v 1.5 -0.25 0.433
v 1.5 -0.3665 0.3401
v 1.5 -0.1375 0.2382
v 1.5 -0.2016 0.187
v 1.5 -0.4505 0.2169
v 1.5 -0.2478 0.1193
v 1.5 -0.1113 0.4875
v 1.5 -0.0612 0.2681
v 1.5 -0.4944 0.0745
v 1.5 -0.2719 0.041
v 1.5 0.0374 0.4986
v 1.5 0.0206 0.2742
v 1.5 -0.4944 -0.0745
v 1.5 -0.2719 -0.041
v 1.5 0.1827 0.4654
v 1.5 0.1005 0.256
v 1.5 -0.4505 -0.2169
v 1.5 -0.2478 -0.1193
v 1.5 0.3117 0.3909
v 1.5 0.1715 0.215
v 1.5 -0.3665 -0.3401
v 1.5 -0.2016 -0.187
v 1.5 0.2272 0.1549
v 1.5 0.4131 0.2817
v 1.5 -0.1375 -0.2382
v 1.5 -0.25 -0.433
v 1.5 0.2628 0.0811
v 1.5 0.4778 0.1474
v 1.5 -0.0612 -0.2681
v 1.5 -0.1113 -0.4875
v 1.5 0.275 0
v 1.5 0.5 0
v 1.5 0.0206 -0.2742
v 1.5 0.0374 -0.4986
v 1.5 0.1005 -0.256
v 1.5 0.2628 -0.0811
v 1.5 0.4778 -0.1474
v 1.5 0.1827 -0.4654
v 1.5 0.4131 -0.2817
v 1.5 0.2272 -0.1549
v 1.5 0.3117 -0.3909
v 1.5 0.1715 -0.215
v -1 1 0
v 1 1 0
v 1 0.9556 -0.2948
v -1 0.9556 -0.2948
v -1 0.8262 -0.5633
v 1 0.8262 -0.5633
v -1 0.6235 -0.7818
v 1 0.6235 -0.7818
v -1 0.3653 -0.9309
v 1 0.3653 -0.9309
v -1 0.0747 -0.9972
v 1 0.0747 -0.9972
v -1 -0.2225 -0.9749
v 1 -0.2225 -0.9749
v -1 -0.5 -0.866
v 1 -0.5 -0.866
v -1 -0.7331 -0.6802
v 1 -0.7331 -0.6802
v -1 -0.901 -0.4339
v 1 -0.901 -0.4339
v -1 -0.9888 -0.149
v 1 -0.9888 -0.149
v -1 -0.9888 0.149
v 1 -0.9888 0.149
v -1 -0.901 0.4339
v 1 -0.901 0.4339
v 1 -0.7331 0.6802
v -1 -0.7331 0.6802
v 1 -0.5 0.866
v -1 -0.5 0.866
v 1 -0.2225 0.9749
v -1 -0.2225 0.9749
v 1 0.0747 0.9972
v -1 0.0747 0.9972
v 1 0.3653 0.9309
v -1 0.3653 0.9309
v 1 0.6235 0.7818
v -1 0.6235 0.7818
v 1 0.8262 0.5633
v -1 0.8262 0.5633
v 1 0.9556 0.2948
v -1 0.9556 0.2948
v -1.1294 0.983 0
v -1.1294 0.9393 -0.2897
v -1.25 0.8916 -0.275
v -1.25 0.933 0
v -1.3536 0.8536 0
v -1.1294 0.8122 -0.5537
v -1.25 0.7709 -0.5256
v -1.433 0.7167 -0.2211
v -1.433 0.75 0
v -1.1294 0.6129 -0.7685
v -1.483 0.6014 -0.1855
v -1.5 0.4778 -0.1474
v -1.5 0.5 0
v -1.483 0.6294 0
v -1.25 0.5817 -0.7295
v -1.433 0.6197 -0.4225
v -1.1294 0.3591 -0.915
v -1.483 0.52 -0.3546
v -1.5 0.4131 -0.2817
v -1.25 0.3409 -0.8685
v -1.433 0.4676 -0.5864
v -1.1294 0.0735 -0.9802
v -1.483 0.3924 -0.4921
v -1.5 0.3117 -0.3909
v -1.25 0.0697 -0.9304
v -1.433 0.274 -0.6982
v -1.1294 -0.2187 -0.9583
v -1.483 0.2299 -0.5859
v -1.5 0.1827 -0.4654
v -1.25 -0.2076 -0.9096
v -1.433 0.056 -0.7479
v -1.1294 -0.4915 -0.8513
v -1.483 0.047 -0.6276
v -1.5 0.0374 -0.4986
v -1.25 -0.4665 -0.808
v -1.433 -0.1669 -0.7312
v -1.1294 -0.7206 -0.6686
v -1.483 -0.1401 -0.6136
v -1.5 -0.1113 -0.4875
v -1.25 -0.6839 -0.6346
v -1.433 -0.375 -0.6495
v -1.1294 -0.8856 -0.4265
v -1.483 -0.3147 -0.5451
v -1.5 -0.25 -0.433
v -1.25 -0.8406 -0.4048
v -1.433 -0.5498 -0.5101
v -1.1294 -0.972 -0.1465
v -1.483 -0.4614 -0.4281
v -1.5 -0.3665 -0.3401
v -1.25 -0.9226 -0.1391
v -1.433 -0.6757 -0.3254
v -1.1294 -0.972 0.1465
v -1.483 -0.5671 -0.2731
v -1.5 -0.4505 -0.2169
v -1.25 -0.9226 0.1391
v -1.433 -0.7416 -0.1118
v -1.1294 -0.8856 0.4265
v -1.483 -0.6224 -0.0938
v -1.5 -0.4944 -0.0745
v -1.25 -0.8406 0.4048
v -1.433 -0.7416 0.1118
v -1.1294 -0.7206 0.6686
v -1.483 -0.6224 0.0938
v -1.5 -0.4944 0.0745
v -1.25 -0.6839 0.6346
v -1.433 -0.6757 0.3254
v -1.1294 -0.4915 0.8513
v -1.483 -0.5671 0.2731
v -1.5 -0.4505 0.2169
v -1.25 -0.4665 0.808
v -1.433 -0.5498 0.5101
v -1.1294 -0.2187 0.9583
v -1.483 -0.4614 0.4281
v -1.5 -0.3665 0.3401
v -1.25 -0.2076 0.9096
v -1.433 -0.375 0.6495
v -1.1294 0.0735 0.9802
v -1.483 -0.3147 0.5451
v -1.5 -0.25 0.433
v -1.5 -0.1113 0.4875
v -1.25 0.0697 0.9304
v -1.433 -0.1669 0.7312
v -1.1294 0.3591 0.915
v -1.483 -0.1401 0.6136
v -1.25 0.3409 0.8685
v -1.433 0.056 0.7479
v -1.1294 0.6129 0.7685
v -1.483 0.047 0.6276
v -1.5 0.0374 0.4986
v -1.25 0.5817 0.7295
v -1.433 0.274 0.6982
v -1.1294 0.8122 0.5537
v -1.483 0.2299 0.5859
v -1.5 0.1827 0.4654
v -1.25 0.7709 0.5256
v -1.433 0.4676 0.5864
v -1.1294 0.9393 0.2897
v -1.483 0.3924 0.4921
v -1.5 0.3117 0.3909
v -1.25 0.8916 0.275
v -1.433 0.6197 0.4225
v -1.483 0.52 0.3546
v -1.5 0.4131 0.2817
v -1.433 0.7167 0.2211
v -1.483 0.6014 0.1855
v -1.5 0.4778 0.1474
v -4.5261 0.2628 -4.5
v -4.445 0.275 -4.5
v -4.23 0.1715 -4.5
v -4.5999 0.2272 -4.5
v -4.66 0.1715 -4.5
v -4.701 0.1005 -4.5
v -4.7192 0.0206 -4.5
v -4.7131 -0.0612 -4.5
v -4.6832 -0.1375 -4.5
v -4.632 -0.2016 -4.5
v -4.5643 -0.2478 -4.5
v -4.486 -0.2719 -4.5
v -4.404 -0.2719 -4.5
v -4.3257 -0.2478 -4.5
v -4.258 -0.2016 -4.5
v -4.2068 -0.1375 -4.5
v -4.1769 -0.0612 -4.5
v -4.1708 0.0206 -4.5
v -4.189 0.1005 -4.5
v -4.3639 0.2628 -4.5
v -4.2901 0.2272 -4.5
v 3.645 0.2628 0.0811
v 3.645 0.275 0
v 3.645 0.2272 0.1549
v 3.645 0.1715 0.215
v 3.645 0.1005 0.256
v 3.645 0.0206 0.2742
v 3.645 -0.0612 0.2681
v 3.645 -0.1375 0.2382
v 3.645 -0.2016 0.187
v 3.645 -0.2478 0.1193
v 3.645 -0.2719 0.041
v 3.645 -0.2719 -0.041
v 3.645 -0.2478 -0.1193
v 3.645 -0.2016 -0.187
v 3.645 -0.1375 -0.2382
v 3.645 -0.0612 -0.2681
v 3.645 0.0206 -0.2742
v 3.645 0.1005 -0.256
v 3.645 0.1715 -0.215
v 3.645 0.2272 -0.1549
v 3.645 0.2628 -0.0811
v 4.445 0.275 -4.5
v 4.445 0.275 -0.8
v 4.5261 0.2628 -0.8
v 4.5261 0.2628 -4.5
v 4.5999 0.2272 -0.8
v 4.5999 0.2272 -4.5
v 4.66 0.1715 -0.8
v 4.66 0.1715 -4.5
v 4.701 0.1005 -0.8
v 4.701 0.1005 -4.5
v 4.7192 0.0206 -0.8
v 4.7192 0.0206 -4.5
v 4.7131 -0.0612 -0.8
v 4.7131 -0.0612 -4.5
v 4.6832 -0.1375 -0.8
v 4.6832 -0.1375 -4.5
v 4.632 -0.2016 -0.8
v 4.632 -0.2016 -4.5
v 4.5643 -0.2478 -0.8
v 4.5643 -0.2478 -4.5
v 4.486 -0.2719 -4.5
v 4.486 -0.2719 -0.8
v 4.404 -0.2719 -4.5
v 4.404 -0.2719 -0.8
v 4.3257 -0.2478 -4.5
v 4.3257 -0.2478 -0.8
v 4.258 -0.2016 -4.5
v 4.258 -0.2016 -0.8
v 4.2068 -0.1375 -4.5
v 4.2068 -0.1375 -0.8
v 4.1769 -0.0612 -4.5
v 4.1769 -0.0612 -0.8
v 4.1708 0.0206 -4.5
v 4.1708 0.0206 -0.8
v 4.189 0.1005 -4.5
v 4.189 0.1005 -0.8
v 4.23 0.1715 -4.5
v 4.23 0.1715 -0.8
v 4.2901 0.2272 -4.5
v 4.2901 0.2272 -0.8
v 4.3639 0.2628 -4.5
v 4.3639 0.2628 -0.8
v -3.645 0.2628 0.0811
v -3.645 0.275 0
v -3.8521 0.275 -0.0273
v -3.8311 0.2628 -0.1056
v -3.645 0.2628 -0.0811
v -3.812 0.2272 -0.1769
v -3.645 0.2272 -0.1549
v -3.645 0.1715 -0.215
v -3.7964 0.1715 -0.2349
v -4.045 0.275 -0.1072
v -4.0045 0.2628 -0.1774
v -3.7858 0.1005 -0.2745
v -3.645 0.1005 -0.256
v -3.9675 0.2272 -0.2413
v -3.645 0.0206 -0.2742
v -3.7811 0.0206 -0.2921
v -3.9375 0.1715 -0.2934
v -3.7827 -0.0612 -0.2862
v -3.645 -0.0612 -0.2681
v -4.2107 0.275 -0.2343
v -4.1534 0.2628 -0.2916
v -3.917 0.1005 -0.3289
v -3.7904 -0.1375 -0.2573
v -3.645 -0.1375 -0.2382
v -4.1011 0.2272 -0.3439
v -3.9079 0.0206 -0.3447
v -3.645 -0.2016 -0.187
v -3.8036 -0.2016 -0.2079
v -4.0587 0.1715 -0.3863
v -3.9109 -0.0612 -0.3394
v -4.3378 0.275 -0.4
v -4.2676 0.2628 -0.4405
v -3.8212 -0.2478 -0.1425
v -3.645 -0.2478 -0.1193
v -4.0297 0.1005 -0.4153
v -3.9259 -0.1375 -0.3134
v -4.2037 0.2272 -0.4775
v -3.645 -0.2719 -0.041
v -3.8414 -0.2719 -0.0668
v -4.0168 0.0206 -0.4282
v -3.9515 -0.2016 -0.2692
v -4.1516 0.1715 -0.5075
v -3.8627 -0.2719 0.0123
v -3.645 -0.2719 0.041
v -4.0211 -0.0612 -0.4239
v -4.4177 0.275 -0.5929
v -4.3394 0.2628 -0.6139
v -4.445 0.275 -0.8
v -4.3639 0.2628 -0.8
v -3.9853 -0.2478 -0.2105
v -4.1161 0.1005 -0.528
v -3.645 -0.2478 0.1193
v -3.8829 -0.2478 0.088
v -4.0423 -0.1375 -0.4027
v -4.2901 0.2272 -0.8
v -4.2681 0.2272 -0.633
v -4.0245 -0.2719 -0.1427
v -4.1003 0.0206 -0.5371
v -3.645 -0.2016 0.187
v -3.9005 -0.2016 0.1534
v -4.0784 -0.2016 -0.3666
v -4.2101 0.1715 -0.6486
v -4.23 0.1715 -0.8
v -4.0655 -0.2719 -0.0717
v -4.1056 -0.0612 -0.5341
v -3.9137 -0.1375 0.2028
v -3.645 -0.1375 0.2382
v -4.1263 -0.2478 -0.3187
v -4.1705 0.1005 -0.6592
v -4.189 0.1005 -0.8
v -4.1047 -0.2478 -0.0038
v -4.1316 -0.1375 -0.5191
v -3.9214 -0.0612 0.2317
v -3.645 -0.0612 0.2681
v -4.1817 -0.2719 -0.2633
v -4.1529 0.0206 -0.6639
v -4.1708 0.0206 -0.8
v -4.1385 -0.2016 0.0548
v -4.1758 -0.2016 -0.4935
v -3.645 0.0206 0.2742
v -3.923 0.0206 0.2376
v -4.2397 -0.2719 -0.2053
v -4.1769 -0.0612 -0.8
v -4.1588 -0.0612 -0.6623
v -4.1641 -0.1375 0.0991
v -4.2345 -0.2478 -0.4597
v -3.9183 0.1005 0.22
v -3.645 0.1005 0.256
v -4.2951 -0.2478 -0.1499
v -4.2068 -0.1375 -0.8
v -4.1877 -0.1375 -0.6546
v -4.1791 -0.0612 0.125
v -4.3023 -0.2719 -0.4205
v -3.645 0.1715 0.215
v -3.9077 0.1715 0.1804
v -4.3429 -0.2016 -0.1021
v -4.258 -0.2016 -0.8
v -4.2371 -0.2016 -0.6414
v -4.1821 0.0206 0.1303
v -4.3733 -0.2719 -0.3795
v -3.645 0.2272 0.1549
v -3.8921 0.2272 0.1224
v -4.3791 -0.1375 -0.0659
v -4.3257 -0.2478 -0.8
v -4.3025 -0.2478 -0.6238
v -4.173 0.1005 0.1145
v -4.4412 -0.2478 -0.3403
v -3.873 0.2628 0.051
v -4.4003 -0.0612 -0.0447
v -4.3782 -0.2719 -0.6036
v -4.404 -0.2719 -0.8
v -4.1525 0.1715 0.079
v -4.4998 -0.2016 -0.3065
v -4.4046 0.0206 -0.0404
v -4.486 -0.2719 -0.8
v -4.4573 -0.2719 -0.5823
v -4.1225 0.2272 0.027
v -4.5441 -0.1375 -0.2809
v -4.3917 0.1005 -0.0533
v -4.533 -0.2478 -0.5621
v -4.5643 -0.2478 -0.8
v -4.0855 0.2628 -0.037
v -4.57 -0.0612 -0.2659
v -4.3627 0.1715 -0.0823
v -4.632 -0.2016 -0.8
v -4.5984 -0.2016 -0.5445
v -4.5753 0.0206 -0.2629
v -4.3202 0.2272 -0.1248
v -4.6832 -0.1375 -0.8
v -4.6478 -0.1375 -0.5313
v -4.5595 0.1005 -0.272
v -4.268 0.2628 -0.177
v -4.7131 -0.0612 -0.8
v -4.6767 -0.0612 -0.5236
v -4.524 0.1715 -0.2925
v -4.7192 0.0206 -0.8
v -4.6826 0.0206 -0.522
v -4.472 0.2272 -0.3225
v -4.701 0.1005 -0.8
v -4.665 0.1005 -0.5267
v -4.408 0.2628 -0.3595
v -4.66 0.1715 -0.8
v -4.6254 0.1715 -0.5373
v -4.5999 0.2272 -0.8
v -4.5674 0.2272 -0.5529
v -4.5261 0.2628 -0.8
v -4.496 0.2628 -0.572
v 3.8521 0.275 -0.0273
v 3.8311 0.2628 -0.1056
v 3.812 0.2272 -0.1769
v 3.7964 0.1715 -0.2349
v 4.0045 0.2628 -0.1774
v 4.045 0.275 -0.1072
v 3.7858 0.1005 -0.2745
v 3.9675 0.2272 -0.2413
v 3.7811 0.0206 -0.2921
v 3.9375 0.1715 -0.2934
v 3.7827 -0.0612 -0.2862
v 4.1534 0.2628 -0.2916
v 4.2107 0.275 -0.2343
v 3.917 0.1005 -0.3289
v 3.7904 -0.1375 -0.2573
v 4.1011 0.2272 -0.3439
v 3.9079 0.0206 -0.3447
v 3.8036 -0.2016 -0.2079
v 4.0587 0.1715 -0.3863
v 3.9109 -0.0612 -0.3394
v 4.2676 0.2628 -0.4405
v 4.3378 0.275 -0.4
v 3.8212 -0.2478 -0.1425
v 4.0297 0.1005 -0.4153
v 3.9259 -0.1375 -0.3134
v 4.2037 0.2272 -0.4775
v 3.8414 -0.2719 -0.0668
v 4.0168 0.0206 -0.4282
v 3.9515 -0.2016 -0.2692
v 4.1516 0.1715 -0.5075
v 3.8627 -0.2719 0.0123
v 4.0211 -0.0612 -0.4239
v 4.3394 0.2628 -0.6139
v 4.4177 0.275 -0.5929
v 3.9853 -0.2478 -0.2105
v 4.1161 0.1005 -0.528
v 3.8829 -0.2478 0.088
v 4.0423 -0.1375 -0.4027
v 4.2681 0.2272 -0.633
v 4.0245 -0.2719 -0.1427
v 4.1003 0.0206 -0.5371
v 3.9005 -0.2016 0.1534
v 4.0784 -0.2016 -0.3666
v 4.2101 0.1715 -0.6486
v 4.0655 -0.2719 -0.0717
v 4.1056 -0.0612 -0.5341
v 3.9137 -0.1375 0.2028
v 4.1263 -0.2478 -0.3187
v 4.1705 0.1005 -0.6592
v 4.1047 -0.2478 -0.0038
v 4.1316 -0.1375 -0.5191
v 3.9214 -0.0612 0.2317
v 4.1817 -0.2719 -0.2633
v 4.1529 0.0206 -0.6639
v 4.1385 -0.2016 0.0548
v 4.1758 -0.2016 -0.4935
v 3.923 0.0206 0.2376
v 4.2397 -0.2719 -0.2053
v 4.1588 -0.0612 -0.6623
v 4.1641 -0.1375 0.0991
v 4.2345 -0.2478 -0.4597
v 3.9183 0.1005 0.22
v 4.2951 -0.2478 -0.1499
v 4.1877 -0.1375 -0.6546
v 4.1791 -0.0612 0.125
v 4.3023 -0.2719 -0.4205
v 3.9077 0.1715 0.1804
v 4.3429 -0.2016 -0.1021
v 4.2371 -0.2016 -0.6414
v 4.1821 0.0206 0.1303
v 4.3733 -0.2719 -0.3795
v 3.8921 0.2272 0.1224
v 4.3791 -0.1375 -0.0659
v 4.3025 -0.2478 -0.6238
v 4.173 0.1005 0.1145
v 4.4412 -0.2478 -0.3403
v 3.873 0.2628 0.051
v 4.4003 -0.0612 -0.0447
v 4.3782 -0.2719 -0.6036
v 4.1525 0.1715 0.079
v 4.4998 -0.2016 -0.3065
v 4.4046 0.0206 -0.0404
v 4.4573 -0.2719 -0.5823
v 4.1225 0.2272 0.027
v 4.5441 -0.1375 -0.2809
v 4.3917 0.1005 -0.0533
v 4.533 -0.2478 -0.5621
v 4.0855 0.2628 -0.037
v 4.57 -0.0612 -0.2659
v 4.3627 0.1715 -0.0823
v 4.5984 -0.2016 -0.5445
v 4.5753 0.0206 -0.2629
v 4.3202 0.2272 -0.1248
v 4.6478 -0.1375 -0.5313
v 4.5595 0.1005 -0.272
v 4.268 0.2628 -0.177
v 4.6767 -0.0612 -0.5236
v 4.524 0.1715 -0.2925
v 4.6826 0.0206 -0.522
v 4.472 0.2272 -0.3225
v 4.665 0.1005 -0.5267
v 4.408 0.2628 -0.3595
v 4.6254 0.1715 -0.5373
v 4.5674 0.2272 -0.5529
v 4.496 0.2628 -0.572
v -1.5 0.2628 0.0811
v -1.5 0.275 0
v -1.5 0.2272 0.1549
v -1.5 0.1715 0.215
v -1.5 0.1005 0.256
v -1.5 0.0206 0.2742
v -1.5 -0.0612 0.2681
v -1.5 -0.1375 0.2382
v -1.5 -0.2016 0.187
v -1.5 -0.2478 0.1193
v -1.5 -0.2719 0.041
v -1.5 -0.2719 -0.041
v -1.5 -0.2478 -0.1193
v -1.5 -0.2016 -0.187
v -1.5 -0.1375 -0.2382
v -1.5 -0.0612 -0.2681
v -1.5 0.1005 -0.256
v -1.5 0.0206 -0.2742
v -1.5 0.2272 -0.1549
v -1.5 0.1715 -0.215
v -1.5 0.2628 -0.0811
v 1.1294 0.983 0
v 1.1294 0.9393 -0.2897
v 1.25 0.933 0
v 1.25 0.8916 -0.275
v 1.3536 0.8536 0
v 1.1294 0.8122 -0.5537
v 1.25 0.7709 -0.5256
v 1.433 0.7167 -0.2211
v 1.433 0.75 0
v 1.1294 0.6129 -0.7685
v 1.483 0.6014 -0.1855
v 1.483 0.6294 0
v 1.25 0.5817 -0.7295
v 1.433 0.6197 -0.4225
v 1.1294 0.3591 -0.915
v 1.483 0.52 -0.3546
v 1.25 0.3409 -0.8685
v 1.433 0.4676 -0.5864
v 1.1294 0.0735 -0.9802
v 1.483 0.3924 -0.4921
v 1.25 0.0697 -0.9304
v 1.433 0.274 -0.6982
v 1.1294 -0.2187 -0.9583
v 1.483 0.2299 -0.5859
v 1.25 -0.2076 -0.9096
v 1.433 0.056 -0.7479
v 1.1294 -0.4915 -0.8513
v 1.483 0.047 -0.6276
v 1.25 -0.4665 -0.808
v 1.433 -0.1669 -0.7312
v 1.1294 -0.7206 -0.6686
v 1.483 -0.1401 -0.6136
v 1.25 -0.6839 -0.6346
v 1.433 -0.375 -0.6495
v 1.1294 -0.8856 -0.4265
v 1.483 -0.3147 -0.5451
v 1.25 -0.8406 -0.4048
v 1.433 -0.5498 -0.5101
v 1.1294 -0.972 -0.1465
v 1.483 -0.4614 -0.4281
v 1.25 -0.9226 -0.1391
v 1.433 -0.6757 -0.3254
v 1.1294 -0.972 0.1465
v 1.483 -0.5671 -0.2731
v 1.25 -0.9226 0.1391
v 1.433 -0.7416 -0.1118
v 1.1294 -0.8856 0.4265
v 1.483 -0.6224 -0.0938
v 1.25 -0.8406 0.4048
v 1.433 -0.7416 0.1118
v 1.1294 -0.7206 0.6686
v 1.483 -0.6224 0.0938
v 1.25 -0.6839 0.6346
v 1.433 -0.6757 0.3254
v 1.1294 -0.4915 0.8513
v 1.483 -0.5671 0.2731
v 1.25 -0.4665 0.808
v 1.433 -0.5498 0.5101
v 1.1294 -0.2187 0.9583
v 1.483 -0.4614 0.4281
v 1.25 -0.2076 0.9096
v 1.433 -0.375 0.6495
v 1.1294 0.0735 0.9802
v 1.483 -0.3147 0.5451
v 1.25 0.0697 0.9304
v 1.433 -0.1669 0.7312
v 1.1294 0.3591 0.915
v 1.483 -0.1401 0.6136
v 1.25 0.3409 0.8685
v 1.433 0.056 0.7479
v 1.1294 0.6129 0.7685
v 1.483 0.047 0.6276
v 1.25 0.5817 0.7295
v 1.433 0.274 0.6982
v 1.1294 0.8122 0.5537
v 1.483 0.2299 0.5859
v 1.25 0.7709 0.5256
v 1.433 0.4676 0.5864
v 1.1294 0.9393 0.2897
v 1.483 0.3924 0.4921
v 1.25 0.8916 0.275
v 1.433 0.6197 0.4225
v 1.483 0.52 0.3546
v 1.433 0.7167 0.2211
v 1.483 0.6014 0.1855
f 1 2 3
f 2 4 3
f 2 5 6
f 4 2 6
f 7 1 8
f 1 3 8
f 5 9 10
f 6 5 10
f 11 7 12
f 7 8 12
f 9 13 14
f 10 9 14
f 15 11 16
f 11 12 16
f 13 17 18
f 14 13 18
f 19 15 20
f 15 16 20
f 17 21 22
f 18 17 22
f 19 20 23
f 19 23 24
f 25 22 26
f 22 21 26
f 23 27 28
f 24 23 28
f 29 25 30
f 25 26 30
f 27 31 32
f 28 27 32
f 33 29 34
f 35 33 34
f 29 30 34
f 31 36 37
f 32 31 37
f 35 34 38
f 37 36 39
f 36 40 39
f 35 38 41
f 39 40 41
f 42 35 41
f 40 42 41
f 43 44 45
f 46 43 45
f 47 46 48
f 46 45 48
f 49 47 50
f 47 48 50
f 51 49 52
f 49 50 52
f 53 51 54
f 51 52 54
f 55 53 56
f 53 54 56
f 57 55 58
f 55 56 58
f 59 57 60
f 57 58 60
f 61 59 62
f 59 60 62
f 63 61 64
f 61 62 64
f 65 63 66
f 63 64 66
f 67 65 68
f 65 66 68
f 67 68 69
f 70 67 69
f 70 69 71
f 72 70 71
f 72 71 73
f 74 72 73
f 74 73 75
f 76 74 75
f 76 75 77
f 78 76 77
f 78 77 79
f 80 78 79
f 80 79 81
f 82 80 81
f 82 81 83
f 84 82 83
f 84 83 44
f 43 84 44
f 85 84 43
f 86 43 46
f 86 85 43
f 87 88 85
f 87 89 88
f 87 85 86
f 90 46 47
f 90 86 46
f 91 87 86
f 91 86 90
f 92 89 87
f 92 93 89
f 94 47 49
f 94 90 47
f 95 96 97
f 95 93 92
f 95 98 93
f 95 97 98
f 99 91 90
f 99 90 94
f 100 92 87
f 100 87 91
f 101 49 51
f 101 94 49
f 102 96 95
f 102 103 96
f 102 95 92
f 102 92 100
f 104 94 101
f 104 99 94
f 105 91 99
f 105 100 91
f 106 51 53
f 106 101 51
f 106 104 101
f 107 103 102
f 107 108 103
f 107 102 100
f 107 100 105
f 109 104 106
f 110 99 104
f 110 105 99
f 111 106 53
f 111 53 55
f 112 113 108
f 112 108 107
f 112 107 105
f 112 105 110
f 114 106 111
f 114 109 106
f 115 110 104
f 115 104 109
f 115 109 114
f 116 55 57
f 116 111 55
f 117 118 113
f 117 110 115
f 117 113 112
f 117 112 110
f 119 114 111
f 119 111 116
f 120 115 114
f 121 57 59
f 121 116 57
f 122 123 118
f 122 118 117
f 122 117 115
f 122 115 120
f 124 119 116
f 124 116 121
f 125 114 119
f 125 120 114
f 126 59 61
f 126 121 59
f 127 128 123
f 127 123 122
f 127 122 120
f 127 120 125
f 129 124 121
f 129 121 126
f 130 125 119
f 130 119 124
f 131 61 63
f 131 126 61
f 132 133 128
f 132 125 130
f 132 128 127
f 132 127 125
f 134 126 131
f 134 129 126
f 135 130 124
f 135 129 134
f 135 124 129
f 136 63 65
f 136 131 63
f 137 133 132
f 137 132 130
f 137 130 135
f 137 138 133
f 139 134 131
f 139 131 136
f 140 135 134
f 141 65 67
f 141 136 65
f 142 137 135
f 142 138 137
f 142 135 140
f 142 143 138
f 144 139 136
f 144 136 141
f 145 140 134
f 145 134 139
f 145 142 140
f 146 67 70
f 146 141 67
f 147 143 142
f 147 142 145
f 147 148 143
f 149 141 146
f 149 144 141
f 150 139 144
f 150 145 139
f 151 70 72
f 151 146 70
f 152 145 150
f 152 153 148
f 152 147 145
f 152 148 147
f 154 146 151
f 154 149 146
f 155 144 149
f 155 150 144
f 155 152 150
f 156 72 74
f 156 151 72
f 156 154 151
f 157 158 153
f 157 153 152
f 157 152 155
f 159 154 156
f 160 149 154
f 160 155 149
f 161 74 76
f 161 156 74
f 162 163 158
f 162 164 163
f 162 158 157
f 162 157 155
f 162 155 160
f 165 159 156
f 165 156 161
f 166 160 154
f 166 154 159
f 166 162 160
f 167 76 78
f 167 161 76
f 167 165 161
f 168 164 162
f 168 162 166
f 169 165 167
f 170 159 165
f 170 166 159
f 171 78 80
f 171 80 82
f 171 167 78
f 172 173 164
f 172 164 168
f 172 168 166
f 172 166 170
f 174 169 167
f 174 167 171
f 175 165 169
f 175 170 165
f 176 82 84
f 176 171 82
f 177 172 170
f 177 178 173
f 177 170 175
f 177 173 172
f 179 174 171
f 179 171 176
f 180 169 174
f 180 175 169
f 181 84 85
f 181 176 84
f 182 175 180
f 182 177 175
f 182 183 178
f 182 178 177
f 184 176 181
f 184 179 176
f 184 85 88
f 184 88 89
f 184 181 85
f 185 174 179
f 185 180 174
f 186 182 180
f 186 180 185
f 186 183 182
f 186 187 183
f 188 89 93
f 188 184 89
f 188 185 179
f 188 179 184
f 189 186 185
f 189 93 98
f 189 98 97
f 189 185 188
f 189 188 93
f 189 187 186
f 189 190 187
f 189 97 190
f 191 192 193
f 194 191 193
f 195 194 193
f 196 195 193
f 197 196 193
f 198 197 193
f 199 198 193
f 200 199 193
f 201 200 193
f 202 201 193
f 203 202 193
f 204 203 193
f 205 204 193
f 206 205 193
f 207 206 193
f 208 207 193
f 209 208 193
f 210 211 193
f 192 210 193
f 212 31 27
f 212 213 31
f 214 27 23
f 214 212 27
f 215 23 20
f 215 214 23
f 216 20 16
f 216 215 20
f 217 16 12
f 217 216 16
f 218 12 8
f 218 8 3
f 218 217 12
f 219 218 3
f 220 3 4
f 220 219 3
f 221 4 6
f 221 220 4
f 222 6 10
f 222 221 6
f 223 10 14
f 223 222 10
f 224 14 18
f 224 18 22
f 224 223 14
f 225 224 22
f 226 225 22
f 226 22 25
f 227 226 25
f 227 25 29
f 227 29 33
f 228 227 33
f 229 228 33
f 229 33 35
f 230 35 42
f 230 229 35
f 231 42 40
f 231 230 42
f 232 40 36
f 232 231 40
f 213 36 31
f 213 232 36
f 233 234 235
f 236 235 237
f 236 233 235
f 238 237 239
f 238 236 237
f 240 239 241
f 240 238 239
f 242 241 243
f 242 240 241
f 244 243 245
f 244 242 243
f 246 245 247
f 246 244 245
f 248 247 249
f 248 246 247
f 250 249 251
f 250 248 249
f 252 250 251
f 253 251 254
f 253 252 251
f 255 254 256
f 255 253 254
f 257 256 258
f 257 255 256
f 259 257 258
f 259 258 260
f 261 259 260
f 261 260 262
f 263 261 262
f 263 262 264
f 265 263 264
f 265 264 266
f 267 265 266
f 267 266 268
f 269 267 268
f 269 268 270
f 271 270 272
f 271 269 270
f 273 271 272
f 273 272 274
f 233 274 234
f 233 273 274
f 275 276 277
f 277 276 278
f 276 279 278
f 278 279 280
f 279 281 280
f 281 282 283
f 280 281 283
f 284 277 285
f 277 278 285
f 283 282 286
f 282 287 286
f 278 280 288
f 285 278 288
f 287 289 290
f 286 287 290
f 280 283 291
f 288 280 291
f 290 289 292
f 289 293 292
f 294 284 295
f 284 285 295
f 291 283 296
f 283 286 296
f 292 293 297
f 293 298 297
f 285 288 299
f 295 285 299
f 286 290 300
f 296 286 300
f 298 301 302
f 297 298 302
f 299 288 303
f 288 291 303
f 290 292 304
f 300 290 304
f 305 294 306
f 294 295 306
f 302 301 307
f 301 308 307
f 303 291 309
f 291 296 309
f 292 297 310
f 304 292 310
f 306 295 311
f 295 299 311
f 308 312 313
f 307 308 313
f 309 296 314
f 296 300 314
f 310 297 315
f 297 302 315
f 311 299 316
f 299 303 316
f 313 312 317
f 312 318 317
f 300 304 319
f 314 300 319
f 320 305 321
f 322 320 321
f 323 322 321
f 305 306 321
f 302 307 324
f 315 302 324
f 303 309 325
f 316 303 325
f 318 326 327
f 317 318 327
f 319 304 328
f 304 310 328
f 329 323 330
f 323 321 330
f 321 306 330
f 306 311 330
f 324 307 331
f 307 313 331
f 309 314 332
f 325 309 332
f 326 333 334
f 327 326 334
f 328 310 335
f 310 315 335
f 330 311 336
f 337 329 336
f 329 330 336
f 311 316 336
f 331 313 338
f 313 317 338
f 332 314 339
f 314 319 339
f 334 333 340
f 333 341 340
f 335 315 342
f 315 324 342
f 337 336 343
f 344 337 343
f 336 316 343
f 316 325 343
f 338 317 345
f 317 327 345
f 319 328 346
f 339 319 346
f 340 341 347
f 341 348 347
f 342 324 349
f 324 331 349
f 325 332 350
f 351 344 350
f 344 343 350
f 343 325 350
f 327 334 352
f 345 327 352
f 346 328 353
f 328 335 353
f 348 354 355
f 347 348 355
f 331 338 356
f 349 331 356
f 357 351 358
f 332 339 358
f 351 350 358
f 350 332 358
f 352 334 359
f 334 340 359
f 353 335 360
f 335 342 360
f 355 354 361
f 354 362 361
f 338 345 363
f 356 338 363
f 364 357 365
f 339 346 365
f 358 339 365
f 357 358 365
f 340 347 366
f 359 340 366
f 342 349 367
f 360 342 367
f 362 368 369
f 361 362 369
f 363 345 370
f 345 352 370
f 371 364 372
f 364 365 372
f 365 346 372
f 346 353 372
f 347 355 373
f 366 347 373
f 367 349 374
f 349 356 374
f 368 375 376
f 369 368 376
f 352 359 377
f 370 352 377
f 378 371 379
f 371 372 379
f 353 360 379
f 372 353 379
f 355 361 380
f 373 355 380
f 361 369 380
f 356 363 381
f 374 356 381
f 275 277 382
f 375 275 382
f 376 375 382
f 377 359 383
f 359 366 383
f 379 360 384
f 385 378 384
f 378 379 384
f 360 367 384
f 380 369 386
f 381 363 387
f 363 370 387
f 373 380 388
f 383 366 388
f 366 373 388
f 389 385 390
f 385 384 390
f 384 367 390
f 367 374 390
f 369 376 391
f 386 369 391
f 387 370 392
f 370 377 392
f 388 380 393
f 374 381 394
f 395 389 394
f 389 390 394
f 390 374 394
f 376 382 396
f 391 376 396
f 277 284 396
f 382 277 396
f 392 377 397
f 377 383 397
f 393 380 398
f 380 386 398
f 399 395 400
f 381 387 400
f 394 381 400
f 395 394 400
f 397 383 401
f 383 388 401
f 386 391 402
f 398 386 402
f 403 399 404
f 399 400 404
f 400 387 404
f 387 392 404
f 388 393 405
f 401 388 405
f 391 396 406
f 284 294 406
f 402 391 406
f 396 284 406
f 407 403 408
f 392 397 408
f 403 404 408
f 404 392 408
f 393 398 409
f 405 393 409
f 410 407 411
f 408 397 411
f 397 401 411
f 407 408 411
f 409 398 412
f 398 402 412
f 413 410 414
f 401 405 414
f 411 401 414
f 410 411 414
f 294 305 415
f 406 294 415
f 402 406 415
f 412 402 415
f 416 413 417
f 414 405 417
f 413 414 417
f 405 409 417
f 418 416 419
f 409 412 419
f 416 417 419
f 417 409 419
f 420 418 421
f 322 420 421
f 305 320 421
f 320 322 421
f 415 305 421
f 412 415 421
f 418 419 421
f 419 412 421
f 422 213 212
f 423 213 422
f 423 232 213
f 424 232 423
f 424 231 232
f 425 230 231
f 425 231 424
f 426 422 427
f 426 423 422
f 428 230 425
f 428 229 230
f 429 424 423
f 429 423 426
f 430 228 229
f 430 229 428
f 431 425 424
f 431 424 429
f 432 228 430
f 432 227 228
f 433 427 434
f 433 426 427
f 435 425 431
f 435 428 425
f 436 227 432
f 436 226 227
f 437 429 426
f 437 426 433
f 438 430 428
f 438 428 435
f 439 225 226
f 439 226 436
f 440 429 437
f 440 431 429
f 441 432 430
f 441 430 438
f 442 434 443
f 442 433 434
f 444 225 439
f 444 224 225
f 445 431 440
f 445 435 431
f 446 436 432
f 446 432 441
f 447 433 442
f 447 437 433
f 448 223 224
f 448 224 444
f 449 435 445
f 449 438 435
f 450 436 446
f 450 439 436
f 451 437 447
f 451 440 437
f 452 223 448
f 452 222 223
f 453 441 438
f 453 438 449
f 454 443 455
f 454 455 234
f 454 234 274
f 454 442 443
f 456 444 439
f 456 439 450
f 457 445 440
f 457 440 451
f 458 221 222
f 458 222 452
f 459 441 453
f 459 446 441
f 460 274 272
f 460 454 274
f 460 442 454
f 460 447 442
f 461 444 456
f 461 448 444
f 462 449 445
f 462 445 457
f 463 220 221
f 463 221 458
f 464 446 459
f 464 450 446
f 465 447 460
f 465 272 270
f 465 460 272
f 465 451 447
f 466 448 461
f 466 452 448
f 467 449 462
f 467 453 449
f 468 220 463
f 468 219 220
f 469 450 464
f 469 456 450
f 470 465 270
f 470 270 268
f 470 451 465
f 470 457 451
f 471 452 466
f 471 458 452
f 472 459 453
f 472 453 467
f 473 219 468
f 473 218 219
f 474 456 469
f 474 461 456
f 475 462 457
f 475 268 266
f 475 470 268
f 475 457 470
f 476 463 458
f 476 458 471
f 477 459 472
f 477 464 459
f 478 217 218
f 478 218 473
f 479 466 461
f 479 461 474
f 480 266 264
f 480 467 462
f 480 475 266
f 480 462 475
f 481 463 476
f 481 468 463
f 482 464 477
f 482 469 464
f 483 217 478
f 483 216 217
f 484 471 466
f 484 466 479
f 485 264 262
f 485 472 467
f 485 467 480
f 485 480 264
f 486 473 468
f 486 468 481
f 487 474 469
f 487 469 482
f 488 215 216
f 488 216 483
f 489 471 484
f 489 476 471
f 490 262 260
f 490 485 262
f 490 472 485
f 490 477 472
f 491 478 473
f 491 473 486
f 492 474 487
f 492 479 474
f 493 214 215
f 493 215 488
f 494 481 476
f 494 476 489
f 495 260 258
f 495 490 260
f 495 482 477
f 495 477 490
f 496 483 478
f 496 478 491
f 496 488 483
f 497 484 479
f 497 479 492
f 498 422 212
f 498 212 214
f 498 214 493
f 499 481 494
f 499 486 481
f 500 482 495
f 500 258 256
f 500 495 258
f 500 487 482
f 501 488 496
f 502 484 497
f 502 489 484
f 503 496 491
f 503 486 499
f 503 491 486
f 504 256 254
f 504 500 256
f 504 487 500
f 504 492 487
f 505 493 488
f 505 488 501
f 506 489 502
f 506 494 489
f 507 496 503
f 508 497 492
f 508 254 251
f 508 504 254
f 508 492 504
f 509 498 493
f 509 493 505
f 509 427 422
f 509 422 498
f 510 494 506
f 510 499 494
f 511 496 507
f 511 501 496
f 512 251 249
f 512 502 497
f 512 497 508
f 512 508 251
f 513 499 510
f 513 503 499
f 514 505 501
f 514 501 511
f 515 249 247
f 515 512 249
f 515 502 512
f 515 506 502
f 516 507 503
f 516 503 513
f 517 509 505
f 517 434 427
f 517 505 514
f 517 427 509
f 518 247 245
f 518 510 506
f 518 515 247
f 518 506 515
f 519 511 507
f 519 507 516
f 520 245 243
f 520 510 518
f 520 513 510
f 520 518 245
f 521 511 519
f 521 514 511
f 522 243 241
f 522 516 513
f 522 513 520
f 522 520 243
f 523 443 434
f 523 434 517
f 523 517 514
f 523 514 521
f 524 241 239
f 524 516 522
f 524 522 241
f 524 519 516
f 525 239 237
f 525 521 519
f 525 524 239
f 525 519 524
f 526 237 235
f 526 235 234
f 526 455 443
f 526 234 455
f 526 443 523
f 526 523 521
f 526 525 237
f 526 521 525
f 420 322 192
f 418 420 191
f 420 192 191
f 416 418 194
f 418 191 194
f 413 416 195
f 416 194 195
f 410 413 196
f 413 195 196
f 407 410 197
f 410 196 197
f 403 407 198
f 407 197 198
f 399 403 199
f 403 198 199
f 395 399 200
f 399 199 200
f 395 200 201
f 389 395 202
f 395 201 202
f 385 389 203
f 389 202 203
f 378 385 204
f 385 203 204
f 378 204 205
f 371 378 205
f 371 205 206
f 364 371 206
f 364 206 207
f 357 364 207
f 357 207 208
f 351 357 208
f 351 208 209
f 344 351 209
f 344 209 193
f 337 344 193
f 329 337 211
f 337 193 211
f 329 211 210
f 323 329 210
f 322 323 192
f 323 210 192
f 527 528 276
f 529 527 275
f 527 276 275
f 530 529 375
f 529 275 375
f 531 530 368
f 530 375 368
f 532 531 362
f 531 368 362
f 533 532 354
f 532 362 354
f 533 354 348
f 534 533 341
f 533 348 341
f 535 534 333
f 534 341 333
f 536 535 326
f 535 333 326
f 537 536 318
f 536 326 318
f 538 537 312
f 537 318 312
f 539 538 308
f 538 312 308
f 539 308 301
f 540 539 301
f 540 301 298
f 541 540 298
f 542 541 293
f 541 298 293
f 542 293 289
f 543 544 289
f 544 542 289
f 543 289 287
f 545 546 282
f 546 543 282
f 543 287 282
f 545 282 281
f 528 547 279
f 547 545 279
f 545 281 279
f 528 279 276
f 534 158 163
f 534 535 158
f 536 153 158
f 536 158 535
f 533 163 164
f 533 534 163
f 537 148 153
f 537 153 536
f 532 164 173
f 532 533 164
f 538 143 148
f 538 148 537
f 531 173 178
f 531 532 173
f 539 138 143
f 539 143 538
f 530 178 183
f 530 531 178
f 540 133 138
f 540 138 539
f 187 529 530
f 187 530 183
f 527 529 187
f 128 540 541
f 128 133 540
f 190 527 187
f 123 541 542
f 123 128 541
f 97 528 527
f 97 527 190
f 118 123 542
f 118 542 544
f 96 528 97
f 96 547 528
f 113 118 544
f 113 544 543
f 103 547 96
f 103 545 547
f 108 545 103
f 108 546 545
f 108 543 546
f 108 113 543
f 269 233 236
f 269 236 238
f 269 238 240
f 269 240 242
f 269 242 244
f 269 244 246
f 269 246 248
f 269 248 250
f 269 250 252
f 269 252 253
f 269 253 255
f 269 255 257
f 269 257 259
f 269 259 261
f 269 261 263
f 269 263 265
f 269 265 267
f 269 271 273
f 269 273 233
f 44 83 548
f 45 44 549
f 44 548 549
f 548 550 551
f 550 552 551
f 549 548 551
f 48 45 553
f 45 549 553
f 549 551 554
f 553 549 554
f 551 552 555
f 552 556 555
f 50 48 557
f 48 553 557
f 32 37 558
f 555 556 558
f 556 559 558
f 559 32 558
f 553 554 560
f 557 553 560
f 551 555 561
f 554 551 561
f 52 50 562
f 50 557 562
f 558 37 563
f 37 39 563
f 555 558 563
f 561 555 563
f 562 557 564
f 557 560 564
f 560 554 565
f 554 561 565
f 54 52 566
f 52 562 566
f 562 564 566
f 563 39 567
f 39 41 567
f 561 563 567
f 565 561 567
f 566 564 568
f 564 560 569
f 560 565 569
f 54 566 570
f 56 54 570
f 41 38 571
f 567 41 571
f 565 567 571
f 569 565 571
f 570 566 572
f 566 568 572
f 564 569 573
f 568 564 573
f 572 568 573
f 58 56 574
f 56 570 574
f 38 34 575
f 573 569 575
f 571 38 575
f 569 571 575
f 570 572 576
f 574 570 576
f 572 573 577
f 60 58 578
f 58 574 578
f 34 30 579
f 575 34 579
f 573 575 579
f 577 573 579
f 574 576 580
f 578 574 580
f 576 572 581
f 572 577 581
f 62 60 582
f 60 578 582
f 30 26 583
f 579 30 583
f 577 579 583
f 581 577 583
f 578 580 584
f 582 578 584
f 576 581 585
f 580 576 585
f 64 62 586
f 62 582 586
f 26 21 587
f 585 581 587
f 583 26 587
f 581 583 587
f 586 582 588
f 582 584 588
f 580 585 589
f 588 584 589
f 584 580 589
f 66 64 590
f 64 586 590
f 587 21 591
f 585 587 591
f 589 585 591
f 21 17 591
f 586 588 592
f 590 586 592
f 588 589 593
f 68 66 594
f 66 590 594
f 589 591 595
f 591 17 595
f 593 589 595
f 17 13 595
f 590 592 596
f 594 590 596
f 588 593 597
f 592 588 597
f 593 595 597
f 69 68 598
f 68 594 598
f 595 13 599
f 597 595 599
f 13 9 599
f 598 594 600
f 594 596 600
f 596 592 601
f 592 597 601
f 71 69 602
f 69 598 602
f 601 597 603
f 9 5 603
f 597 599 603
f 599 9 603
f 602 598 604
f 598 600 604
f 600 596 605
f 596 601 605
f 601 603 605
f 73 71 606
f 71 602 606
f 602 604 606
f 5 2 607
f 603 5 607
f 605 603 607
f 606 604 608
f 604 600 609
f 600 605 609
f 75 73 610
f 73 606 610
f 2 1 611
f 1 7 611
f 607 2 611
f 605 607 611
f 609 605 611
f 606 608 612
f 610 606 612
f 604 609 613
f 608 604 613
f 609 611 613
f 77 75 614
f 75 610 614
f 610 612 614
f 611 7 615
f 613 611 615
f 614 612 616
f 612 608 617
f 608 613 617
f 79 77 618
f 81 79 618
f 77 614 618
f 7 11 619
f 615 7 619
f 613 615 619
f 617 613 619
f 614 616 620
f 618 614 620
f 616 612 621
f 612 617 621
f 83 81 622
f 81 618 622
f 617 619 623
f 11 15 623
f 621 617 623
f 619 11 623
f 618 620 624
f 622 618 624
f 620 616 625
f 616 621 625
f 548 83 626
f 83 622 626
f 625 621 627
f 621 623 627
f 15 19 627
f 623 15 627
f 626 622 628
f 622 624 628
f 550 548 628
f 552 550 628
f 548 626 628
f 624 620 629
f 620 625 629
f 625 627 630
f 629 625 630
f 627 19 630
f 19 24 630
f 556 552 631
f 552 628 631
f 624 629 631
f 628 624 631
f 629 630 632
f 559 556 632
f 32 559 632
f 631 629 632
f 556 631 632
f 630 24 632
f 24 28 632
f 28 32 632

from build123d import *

# Parameters (mm, degrees)
F3_R = 0.275


with BuildPart() as f1:
    # F0 (on Top) → F1 (revolve)
    with BuildSketch(Plane.XY):
        with BuildLine():
            Line((0, 0), (0, 1))
            Line((0, 1), (-1, 1))
            ThreePointArc((-1, 1), (-1.3535533906, 0.8535533906), (-1.5, 0.5))
            Line((-1.5, 0.5), (-1.5, 0))
            Line((-1.5, 0), (0, 0))
        make_face()
    revolve(axis=Axis((-0.75, 0, 0), (-1, 0, 0)))

    # F2: F1 across face


with BuildPart() as f1_1:
    add(f1.part)
    add(f1.part.mirror(Plane.YZ))



with BuildPart() as f5:
    # F5: sweep along a path in F4
    with BuildLine(Plane.XZ) as f5_path:
        Line((0, 0), (3.645, 0))
        ThreePointArc((3.645, 0), (4.2106854249, -0.2343145751), (4.445, -0.8))
        Line((4.445, -0.8), (4.445, -4.5))
    # F3 (on Right) → F5 (sweep)
    with BuildSketch(Plane.YZ):
        Circle(F3_R)
    sweep(path=f5_path.line)


with BuildPart() as f1_2:
    add(f1_1.part)

    add(f5.part)  # F6 merges F5
    # F6: F5 across plane
    add(f5.part.mirror(Plane.YZ))


solid = f1_2.part
